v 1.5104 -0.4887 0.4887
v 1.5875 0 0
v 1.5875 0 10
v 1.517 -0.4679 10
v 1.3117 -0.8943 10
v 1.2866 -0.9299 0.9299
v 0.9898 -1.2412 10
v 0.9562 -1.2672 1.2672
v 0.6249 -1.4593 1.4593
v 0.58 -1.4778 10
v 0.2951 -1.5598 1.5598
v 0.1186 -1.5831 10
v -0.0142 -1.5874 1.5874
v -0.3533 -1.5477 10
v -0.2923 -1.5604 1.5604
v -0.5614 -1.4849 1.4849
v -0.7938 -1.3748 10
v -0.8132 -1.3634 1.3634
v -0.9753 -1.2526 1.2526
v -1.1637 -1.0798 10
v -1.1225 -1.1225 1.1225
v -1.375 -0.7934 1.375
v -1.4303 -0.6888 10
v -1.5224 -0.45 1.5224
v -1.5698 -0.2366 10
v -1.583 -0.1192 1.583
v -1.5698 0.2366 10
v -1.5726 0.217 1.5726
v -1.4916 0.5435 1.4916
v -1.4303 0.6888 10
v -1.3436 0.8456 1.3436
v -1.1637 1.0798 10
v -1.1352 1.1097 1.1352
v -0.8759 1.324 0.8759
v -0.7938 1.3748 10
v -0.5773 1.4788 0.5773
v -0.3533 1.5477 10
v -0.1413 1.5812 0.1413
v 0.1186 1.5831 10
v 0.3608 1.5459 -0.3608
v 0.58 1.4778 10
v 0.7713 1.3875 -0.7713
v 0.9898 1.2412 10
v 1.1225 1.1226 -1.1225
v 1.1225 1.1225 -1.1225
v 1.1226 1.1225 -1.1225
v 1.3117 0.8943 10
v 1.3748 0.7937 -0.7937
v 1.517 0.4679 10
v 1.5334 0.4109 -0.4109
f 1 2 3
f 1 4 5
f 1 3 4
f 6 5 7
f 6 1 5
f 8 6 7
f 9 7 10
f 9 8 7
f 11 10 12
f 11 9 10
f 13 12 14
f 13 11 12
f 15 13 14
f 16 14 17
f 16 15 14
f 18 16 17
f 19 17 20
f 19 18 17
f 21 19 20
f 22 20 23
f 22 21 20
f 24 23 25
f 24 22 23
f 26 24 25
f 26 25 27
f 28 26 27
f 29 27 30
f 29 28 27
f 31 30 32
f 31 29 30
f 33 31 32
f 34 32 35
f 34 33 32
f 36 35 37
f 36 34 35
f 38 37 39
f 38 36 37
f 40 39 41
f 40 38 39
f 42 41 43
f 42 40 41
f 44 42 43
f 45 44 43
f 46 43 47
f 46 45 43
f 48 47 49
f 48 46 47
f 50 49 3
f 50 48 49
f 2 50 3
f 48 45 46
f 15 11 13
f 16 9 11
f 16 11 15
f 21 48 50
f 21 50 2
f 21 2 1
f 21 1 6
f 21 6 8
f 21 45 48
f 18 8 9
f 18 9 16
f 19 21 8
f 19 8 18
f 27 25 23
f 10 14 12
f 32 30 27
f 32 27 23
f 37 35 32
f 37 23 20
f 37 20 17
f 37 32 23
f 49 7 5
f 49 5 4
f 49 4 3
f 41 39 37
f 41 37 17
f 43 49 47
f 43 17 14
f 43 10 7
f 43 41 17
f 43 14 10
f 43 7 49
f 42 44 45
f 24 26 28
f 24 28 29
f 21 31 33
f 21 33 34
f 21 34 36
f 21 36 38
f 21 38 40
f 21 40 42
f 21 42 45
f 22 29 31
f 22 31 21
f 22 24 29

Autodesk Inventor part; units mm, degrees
ref_plane "Start Plane" through (0, 0, -1.1225) normal (0, 0, 1) x (1, 0, 0)
ref_plane "End Plane" through (0, 0, 10) normal (0, 0, 1) x (1, 0, 0)
sketch "Sketch" plane through (0, 0, 0) normal (0, 0, 1) x (1, 0, 0)
  circle A0 centre (0, 0) radius 1.5875
  dimension "d0" = 3.175
extrude "Body" add sketch "Sketch" along normal up to surface (11.1225 mm away) from surface at -1.1225
sketch "Sketch2" plane through (0, 0, 0) normal (0, 0, 1) x (1, 0, 0)
  line L0 (0, 0) -> (10, 0)
ref_plane "Work Plane3" through (0, 0, 0) normal (0, -1, 0) x (1, 0, 0)
sketch "Sketch3" plane through (0, 0, 0) normal (0, -1, 0) x (1, 0, 0)
  line L0 (-2, -1.1225) -> (12, -1.1225)
  line L1 (-2, 10) -> (12, 10)
  dimension "d7" = 11.1225
ref_plane "Work Plane4" through (0, 1.5875, -1.5875) normal (0, -0.7071, -0.7071) x (1, 0, 0)
split "Split1" plane through (0, 1.5875, -1.5875) removes the side toward (0, -0.7071, -0.7071)
ref_plane "Work Plane5" through (1.5875, 0, -1.5875) normal (-0.7071, 0, -0.7071) x (-0.7071, 0, 0.7071)
split "Split2" plane through (1.5875, 0, -1.5875) removes the side toward (-0.7071, 0, -0.7071)
equation "\"d0\" = Diam"
equation "\"d1\" = G_L"
equation "\"Diam\" = 3.175"
equation "\"G_L\" = d7"
equation "\"G_OFFSET_START\" = 1.12253"
equation "\"G_OFFSET_END\" = 0"
equation "\"d4\" = -G_OFFSET_START"
equation "\"d5\" = G_OFFSET_END + B_L"
equation "\"B_L\" = 10"
properties part number "ANSI/AISC Rolled Steel - 1/8-0,438, RB" material "Steel, Mild"
